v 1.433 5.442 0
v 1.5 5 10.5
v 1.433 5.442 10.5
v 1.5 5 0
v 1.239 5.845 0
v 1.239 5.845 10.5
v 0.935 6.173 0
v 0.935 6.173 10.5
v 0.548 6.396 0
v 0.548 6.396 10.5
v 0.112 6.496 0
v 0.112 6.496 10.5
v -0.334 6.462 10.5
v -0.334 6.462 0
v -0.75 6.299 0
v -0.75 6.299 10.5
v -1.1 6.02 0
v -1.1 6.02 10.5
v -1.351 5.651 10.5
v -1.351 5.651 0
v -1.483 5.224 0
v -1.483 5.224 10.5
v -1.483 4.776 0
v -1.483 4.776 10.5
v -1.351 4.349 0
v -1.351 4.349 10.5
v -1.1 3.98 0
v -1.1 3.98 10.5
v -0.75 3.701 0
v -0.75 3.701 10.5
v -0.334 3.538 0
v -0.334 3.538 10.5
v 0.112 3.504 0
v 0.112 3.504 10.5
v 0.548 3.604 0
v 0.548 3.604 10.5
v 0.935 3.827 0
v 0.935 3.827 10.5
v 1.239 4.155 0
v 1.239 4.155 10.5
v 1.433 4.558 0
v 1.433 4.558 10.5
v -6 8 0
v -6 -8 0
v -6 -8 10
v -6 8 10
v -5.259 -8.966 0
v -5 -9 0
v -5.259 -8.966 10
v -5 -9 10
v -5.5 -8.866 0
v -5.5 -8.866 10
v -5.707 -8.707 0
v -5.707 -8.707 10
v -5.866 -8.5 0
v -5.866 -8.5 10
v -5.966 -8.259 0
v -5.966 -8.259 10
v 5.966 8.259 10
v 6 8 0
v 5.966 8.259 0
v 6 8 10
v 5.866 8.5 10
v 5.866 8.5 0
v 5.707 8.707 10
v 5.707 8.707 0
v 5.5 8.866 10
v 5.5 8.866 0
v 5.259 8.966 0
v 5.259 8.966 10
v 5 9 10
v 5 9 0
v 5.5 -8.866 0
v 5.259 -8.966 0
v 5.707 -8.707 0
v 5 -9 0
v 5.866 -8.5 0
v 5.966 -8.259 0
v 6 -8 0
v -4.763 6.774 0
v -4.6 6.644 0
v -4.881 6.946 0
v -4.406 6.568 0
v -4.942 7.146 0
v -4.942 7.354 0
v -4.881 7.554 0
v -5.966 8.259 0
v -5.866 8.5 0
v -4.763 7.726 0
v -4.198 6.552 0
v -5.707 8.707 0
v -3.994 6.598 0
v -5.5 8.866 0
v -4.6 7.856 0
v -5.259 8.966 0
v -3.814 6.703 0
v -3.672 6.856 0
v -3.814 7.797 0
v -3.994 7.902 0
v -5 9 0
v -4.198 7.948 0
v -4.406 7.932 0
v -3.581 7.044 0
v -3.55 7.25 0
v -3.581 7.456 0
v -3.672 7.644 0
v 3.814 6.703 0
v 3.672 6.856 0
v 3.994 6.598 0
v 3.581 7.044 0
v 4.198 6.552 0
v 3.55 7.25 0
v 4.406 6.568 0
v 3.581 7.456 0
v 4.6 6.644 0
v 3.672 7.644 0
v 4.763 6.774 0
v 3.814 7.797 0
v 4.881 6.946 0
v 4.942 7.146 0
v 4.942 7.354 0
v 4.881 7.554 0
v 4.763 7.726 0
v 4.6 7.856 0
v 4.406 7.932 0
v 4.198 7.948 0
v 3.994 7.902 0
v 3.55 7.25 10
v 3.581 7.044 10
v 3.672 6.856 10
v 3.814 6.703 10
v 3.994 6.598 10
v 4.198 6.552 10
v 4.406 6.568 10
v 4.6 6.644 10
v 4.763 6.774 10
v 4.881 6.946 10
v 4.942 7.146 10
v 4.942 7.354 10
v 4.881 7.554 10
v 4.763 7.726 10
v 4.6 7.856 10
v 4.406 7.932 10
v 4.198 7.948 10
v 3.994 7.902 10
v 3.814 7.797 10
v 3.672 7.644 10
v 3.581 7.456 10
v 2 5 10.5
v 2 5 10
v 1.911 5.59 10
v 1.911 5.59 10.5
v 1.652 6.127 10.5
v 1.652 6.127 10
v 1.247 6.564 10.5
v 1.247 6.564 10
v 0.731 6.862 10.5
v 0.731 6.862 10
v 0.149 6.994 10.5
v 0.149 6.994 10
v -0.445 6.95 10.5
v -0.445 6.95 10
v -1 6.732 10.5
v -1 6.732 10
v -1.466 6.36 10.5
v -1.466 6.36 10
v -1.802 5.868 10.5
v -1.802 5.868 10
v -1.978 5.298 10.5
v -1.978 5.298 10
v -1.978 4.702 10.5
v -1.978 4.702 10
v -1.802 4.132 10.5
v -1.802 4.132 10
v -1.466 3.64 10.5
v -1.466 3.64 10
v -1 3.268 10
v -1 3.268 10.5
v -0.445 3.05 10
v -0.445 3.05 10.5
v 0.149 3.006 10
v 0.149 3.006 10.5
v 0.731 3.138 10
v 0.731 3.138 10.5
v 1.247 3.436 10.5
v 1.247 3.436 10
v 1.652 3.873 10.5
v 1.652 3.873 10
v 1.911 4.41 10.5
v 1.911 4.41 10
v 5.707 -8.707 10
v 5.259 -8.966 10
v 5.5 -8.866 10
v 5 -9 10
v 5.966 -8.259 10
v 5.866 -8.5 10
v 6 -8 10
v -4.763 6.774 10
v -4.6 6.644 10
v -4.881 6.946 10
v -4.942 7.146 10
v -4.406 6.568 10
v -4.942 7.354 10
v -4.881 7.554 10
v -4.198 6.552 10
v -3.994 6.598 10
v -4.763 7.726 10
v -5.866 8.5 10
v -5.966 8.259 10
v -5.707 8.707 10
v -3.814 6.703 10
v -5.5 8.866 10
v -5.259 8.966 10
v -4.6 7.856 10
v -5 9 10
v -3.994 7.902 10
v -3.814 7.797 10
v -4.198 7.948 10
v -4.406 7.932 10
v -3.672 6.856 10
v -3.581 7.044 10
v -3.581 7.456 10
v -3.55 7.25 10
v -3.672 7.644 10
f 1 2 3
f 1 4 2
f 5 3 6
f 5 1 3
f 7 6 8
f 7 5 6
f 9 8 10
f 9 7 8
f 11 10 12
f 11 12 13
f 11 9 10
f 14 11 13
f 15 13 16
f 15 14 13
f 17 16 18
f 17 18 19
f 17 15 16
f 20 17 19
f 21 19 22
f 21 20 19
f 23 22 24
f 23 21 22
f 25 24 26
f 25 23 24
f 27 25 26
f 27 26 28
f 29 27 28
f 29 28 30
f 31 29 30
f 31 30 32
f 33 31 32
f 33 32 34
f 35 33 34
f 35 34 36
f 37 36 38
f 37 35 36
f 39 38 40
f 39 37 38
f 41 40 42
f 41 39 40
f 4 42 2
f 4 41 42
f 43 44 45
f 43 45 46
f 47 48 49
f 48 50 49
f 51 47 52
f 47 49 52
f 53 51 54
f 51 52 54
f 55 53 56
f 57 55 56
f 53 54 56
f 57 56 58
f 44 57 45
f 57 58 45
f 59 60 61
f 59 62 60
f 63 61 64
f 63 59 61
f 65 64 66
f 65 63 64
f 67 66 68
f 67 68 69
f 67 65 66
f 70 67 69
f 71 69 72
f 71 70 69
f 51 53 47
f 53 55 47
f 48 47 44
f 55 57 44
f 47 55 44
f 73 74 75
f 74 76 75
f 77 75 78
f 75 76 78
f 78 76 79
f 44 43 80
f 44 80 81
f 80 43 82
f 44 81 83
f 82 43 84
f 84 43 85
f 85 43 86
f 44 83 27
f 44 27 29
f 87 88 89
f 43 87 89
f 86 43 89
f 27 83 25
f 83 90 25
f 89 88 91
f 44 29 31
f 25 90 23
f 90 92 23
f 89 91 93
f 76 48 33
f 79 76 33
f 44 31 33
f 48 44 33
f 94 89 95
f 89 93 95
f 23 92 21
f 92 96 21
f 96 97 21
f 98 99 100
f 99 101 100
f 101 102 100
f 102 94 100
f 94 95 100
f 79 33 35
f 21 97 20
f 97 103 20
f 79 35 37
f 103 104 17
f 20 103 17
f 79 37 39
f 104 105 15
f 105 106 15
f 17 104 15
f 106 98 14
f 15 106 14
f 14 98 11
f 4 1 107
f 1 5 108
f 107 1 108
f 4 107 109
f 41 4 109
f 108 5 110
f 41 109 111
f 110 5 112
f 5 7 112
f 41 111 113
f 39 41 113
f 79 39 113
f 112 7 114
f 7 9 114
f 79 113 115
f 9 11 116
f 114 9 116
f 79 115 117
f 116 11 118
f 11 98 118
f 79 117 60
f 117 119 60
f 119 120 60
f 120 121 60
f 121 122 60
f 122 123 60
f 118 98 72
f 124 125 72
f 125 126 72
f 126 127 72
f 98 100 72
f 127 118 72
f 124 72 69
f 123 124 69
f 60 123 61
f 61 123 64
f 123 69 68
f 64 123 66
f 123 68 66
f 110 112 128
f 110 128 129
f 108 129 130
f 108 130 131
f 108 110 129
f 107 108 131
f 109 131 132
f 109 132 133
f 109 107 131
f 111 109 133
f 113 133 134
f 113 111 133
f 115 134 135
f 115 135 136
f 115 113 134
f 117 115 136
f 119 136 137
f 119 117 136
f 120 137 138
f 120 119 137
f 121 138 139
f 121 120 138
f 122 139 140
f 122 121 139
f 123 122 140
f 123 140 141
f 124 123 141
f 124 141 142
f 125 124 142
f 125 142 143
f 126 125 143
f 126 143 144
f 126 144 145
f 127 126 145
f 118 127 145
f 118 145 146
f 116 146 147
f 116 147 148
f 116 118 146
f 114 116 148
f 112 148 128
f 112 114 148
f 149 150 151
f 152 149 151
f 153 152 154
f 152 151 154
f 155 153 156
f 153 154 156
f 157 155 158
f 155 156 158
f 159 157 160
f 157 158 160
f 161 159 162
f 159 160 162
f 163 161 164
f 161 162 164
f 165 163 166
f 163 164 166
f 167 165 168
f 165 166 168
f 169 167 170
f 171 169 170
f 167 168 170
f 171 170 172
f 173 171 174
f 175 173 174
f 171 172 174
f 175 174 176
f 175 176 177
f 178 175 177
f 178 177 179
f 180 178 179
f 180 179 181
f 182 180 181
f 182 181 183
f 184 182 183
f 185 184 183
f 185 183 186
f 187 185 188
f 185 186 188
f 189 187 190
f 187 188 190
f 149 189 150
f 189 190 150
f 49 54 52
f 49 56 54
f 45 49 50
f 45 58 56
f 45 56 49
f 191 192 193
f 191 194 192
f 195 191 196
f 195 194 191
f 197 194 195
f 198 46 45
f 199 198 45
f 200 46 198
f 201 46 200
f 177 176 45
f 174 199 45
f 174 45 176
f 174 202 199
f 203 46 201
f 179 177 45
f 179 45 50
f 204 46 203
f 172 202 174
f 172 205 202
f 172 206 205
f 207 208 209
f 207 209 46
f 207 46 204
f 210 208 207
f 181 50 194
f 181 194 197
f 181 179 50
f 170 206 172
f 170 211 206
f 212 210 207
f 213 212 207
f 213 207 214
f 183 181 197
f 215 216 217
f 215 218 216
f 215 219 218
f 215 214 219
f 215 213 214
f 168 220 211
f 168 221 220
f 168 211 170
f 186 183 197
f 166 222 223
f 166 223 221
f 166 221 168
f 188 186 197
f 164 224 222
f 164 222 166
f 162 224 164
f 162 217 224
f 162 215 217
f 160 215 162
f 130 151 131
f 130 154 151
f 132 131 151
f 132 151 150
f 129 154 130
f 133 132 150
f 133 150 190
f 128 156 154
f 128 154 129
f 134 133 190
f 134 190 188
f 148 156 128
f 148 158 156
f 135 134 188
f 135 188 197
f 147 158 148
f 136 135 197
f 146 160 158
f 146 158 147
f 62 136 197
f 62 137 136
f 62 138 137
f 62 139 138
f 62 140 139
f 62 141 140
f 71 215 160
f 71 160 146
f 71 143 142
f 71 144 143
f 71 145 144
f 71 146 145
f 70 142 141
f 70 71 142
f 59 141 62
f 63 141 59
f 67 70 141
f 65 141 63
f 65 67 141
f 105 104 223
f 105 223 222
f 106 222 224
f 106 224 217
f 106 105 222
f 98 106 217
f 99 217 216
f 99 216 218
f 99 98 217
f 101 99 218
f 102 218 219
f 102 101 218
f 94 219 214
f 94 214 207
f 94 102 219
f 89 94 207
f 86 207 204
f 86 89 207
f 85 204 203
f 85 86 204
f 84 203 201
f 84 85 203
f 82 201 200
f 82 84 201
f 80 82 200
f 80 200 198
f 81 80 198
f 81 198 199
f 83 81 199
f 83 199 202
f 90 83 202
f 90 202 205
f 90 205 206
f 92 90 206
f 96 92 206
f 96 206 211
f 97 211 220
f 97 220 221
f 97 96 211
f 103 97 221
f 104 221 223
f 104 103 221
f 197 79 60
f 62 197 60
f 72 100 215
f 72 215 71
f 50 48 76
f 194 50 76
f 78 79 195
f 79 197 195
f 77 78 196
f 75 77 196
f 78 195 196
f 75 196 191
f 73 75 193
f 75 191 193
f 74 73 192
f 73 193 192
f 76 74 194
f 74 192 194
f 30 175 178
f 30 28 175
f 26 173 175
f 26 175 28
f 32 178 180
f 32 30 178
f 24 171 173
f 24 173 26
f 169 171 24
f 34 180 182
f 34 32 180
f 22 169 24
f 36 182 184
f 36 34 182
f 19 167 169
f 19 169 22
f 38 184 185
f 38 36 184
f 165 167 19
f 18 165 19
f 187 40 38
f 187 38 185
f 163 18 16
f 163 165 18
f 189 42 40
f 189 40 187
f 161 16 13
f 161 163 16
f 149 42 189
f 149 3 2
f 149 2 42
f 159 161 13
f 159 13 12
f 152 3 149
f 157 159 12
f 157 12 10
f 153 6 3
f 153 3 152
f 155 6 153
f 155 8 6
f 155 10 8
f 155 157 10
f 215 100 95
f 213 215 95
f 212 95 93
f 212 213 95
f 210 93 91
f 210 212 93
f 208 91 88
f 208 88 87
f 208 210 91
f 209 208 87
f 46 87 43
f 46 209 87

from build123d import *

# Parameters (mm, degrees)
SKETCH_1_W      = 12
SKETCH_1_H      = 18
SKETCH_1_R      = 1.5
SKETCH_1_R_2    = 0.7
EXTRUDE_1_DEPTH = 10
SKETCH_2_R      = 2
SKETCH_2_R_2    = 1.5
EXTRUDE_2_DEPTH = 0.5
FILLET_1_R      = 1


with BuildPart() as part:
    # 草图1 → 凸台-拉伸1 (new body)
    with BuildSketch(Plane.XY):
        Rectangle(SKETCH_1_W, SKETCH_1_H)
        with Locations((0, 5)):
            Circle(SKETCH_1_R, mode=Mode.SUBTRACT)
        with Locations((-4.25, 7.25)):
            Circle(SKETCH_1_R_2, mode=Mode.SUBTRACT)
        with Locations(Location((4.25, 7.25, 0), (0, 0, 180))):
            Circle(SKETCH_1_R_2, mode=Mode.SUBTRACT)
    extrude(amount=EXTRUDE_1_DEPTH)

    # 草图2 → 凸台-拉伸2 (add)
    with BuildSketch(Plane.XY.offset(10)):
        with Locations((0, 5)):
            Circle(SKETCH_2_R)
        with Locations((0, 5)):
            Circle(SKETCH_2_R_2, mode=Mode.SUBTRACT)
    extrude(amount=EXTRUDE_2_DEPTH)

    # 圆角1
    fillet_1_edges = [part.edges().sort_by_distance(p)[0] for p in [
        (-6, 9, 5),
        (6, 9, 5),
        (6, -9, 5),
        (-6, -9, 5),
    ]]
    fillet(fillet_1_edges, radius=FILLET_1_R)


solid = part.part
